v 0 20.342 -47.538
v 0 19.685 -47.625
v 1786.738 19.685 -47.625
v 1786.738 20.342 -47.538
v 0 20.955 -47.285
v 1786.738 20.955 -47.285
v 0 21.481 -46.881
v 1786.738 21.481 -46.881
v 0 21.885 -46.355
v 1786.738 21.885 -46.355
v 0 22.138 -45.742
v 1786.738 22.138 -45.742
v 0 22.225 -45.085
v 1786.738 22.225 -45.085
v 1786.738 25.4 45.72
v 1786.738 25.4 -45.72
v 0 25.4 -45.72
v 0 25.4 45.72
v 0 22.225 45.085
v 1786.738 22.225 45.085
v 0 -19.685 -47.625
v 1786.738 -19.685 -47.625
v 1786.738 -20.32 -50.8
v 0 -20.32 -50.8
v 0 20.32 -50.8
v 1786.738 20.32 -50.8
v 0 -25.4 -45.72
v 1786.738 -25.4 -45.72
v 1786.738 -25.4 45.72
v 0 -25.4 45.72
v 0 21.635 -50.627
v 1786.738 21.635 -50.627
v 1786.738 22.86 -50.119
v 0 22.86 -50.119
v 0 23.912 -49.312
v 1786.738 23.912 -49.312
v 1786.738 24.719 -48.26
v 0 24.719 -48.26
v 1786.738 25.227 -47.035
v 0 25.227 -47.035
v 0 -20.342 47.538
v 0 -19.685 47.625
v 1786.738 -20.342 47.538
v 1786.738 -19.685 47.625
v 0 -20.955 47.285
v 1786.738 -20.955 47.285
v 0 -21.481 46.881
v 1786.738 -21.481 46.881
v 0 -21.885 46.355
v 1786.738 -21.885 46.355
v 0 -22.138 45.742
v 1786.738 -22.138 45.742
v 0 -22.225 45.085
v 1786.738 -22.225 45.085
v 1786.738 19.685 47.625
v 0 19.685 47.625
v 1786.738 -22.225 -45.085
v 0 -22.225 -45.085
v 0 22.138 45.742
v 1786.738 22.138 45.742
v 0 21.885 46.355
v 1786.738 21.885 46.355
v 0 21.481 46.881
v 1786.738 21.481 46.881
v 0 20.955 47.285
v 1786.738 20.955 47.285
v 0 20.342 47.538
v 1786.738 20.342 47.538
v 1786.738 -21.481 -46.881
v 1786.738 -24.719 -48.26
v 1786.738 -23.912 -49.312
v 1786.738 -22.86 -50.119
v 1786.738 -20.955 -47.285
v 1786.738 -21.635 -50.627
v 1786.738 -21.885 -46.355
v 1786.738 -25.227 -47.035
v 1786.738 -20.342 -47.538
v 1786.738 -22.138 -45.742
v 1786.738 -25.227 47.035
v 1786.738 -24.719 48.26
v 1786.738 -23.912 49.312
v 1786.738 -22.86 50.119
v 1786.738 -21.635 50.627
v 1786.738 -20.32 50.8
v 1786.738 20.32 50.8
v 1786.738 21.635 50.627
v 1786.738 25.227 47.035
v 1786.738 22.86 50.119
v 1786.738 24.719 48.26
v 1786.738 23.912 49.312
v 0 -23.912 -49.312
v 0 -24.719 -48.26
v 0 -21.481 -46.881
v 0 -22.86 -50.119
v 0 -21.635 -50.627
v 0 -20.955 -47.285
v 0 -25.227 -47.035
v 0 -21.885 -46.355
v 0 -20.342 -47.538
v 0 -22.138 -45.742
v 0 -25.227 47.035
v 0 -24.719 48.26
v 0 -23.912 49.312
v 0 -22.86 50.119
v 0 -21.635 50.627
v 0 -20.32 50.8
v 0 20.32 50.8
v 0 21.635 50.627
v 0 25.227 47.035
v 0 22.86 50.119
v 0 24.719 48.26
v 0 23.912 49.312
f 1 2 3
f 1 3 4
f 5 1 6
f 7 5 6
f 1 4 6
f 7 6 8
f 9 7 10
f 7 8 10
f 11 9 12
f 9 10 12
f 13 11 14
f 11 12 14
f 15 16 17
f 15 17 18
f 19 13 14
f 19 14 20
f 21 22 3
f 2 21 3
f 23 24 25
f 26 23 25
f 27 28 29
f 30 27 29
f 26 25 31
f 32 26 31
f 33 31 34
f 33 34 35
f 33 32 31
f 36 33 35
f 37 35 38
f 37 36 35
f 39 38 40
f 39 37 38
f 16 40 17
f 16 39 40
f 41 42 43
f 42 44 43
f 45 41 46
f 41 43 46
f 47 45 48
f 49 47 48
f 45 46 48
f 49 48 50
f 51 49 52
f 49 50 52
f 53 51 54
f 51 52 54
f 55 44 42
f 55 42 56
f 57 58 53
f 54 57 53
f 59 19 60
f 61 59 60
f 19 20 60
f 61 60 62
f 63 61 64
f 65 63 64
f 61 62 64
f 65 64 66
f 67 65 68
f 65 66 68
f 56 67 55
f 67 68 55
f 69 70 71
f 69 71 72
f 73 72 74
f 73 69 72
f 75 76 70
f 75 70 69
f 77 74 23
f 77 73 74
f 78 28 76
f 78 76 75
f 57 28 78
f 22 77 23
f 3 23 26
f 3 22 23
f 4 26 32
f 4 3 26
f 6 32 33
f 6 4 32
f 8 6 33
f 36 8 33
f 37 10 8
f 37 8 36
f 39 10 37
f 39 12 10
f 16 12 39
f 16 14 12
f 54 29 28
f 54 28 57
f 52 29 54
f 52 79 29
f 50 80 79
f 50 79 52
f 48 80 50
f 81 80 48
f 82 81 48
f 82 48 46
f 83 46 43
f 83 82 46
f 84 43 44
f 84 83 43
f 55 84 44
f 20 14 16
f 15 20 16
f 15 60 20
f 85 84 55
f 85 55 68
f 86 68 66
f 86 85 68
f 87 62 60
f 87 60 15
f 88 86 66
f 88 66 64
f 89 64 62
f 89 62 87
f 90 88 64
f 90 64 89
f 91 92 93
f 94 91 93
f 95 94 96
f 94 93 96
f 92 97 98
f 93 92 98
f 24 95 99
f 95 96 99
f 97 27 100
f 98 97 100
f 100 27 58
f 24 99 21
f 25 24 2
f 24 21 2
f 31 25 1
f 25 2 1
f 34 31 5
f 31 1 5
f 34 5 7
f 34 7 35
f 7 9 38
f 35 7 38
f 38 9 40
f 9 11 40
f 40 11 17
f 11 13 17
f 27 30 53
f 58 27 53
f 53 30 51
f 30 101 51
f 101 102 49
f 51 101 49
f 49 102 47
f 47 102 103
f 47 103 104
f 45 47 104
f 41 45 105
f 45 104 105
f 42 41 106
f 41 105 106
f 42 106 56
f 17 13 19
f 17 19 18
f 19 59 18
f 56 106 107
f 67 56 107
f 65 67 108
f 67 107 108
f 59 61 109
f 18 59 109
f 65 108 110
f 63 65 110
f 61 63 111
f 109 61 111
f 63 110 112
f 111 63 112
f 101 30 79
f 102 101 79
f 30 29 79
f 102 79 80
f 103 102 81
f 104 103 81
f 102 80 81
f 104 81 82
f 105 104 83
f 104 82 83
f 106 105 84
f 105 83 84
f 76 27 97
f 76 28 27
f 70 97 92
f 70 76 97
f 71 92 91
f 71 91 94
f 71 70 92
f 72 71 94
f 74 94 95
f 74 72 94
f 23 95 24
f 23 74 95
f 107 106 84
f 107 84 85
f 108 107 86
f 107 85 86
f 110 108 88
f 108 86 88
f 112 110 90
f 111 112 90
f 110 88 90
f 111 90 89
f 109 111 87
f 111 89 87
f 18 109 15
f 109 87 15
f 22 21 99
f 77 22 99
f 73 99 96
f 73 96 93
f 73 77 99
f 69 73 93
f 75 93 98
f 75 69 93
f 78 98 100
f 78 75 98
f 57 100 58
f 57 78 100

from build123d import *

# Parameters (mm, degrees)
F0_W     = 50.8
F0_H     = 101.6
F0_W_2   = 44.45
F0_H_2   = 95.25
F1_DEPTH = 1786.7376
F2_R     = 2.54
F3_R     = 5.08


with BuildPart() as f1:
    # F0 (on Right) → F1 (new body)
    with BuildSketch(Plane.YZ):
        Rectangle(F0_W, F0_H)
        Rectangle(F0_W_2, F0_H_2, mode=Mode.SUBTRACT)
    extrude(amount=F1_DEPTH)

    # F2
    f2_edges = [f1.edges().sort_by_distance(p)[0] for p in [
        (893.3688, 22.225, 47.625),
        (893.3688, -22.225, 47.625),
        (893.3688, -22.225, -47.625),
        (893.3688, 22.225, -47.625),
    ]]
    fillet(f2_edges, radius=F2_R)

    # F3
    f3_edges = [f1.edges().sort_by_distance(p)[0] for p in [
        (893.3688, -25.4, -50.8),
        (893.3688, -25.4, 50.8),
        (893.3688, 25.4, 50.8),
        (893.3688, 25.4, -50.8),
    ]]
    fillet(f3_edges, radius=F3_R)


solid = f1.part
